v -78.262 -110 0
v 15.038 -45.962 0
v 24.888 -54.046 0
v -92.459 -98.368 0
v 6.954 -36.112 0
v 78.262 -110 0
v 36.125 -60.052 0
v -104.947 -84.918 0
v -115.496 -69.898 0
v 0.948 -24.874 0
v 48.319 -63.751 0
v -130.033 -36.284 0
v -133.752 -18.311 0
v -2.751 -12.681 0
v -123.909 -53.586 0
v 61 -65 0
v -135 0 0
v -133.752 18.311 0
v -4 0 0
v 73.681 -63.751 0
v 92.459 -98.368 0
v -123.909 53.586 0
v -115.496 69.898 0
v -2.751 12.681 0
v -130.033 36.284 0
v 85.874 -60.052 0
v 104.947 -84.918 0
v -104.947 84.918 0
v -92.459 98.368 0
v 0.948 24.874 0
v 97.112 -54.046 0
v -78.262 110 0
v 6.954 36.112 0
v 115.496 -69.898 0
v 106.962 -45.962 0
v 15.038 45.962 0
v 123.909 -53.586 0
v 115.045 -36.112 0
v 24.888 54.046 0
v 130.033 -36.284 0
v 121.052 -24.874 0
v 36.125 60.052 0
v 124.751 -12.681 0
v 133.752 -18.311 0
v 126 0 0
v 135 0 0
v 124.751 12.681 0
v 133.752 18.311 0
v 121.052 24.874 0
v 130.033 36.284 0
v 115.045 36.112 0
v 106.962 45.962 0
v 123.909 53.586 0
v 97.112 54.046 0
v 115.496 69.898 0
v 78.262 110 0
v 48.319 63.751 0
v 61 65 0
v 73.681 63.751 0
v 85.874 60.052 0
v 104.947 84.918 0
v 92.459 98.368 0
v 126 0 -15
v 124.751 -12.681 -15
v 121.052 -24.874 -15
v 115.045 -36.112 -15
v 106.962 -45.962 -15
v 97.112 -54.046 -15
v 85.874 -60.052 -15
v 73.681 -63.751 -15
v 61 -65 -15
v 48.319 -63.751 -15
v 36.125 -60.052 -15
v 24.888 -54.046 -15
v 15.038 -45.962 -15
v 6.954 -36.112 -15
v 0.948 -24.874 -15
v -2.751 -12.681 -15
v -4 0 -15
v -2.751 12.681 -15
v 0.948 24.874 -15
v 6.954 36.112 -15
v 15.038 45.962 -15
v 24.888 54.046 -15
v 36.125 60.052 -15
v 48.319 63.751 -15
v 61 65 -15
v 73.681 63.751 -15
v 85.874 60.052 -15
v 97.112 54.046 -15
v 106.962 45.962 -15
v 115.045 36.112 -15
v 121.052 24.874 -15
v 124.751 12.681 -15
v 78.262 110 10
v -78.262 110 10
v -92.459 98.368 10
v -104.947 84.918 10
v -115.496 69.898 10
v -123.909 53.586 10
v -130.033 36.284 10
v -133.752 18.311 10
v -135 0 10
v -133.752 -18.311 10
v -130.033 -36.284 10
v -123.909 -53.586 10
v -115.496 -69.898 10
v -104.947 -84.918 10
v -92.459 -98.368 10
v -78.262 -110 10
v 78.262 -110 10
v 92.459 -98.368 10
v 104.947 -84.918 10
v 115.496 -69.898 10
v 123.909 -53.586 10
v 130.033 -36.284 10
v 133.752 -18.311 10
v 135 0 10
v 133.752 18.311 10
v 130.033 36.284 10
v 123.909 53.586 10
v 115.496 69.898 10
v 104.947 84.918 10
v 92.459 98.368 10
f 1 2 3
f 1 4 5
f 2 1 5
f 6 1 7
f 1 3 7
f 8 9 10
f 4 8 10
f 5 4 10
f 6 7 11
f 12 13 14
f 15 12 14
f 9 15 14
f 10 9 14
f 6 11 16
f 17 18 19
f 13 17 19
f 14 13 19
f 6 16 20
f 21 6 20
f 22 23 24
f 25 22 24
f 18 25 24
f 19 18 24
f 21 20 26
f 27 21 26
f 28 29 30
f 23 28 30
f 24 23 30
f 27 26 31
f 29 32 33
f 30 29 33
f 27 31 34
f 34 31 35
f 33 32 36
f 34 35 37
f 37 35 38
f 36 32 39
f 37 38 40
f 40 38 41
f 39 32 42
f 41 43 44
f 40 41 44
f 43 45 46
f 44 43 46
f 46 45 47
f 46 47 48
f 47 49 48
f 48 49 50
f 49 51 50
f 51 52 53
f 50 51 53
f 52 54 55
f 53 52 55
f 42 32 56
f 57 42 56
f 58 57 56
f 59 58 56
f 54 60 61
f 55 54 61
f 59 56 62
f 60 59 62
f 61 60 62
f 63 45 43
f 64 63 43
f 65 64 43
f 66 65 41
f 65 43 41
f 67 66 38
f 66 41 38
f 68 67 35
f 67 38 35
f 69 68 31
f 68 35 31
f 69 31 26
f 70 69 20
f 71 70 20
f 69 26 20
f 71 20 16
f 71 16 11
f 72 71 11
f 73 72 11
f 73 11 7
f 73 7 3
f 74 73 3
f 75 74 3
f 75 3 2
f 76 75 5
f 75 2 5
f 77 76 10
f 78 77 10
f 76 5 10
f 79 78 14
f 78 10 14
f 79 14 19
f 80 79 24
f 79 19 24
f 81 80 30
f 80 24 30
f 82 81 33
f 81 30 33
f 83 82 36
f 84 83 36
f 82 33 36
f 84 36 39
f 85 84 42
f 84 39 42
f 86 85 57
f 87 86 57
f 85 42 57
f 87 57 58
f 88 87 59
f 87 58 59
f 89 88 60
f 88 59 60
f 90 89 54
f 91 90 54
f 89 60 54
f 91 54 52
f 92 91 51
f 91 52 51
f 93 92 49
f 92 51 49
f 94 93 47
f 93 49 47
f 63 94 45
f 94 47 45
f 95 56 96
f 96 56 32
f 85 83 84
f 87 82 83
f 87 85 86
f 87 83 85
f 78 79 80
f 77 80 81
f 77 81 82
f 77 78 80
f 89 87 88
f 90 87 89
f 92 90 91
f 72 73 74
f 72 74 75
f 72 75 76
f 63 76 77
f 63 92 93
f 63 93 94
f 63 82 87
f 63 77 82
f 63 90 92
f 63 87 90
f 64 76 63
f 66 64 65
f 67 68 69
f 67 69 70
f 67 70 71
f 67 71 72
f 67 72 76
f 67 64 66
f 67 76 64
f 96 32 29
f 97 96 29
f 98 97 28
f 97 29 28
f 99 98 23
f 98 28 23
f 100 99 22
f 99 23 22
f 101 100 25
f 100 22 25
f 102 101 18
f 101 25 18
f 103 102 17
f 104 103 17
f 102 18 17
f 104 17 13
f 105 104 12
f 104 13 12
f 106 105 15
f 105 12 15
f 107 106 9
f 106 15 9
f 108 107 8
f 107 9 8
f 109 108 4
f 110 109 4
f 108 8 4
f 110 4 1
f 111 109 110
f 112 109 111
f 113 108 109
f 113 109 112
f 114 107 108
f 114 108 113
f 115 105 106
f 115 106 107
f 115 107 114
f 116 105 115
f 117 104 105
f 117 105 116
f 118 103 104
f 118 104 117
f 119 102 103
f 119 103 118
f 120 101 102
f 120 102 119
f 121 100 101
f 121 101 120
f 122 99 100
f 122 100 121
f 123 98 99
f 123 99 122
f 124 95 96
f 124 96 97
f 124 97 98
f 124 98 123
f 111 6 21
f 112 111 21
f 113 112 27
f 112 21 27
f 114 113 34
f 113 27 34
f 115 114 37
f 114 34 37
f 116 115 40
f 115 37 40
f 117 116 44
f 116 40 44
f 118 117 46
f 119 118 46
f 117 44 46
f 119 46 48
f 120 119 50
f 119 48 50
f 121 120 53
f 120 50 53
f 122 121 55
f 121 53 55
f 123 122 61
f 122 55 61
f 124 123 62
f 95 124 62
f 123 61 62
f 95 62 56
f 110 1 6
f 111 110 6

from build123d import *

# Parameters (mm, degrees)
F1_DEPTH = 10
F3_DEPTH = 4
F5_DEPTH = 50
F6_R     = 65
F7_DEPTH = 15
F8_DEPTH = 50
F9_DEPTH = 4


with BuildPart() as f1:
    # F0 (on Top) → F1 (new body)
    with BuildSketch(Plane.XY):
        with BuildLine():
            ThreePointArc((-78.2623792125, 110), (-135, 0), (-78.2623792125, -110))
            Line((-78.2623792125, -110), (78.2623792125, -110))
            ThreePointArc((78.2623792125, -110), (135, 0), (78.2623792125, 110))
            Line((78.2623792125, 110), (-78.2623792125, 110))
        make_face()
    extrude(amount=F1_DEPTH)

    # F2 (on face) → F3 (cut)
    with BuildSketch(Plane.XY.offset(10)):
        with BuildLine():
            Line((-61.4491659829, 110), (-69.2820323028, 110))
            ThreePointArc((-69.2820323028, 110), (-130, 0), (-69.2820323028, -110))
            Line((-69.2820323028, -110), (-61.4491659829, -110))
            ThreePointArc((-61.4491659829, -110), (-126, 0), (-61.4491659829, 110))
        make_face()
        with BuildLine():
            Line((69.2820323028, 110), (61.4491659829, 110))
            ThreePointArc((61.4491659829, 110), (126, 0), (61.4491659829, -110))
            Line((61.4491659829, -110), (69.2820323028, -110))
            ThreePointArc((69.2820323028, -110), (130, 0), (69.2820323028, 110))
        make_face()
    extrude(amount=-F3_DEPTH, mode=Mode.SUBTRACT)

    # F5 (add): faces of the model
    f5_faces = [f1.faces().sort_by_distance(p)[0] for p in [
        (-65.3655991429, 109.7695673269, 6),
        (128.3043267313, 0, 6),
    ]]
    extrude(f5_faces, amount=F5_DEPTH)

    # F6 (on face) → F7 (join)
    with BuildSketch(Plane(origin=(0, 0, 0), x_dir=(1, 0, 0), z_dir=(0, 0, -1))):
        with Locations((60.9998414516, 0)):
            Circle(F6_R)
    extrude(amount=F7_DEPTH)

    # F8 (cut): faces of the model
    f8_faces = [f1.faces().sort_by_distance(p)[0] for p in [
        (-65.3655991429, 109.7695673269, 56),
        (128.3043267313, 0, 56),
    ]]
    extrude(f8_faces, amount=-F8_DEPTH, mode=Mode.SUBTRACT)

    # F9 (add): faces of the model
    f9_faces = [f1.faces().sort_by_distance(p)[0] for p in [
        (-65.3655991429, 109.7695673269, 6),
        (128.3043267313, 0, 6),
    ]]
    extrude(f9_faces, amount=F9_DEPTH)


solid = f1.part
